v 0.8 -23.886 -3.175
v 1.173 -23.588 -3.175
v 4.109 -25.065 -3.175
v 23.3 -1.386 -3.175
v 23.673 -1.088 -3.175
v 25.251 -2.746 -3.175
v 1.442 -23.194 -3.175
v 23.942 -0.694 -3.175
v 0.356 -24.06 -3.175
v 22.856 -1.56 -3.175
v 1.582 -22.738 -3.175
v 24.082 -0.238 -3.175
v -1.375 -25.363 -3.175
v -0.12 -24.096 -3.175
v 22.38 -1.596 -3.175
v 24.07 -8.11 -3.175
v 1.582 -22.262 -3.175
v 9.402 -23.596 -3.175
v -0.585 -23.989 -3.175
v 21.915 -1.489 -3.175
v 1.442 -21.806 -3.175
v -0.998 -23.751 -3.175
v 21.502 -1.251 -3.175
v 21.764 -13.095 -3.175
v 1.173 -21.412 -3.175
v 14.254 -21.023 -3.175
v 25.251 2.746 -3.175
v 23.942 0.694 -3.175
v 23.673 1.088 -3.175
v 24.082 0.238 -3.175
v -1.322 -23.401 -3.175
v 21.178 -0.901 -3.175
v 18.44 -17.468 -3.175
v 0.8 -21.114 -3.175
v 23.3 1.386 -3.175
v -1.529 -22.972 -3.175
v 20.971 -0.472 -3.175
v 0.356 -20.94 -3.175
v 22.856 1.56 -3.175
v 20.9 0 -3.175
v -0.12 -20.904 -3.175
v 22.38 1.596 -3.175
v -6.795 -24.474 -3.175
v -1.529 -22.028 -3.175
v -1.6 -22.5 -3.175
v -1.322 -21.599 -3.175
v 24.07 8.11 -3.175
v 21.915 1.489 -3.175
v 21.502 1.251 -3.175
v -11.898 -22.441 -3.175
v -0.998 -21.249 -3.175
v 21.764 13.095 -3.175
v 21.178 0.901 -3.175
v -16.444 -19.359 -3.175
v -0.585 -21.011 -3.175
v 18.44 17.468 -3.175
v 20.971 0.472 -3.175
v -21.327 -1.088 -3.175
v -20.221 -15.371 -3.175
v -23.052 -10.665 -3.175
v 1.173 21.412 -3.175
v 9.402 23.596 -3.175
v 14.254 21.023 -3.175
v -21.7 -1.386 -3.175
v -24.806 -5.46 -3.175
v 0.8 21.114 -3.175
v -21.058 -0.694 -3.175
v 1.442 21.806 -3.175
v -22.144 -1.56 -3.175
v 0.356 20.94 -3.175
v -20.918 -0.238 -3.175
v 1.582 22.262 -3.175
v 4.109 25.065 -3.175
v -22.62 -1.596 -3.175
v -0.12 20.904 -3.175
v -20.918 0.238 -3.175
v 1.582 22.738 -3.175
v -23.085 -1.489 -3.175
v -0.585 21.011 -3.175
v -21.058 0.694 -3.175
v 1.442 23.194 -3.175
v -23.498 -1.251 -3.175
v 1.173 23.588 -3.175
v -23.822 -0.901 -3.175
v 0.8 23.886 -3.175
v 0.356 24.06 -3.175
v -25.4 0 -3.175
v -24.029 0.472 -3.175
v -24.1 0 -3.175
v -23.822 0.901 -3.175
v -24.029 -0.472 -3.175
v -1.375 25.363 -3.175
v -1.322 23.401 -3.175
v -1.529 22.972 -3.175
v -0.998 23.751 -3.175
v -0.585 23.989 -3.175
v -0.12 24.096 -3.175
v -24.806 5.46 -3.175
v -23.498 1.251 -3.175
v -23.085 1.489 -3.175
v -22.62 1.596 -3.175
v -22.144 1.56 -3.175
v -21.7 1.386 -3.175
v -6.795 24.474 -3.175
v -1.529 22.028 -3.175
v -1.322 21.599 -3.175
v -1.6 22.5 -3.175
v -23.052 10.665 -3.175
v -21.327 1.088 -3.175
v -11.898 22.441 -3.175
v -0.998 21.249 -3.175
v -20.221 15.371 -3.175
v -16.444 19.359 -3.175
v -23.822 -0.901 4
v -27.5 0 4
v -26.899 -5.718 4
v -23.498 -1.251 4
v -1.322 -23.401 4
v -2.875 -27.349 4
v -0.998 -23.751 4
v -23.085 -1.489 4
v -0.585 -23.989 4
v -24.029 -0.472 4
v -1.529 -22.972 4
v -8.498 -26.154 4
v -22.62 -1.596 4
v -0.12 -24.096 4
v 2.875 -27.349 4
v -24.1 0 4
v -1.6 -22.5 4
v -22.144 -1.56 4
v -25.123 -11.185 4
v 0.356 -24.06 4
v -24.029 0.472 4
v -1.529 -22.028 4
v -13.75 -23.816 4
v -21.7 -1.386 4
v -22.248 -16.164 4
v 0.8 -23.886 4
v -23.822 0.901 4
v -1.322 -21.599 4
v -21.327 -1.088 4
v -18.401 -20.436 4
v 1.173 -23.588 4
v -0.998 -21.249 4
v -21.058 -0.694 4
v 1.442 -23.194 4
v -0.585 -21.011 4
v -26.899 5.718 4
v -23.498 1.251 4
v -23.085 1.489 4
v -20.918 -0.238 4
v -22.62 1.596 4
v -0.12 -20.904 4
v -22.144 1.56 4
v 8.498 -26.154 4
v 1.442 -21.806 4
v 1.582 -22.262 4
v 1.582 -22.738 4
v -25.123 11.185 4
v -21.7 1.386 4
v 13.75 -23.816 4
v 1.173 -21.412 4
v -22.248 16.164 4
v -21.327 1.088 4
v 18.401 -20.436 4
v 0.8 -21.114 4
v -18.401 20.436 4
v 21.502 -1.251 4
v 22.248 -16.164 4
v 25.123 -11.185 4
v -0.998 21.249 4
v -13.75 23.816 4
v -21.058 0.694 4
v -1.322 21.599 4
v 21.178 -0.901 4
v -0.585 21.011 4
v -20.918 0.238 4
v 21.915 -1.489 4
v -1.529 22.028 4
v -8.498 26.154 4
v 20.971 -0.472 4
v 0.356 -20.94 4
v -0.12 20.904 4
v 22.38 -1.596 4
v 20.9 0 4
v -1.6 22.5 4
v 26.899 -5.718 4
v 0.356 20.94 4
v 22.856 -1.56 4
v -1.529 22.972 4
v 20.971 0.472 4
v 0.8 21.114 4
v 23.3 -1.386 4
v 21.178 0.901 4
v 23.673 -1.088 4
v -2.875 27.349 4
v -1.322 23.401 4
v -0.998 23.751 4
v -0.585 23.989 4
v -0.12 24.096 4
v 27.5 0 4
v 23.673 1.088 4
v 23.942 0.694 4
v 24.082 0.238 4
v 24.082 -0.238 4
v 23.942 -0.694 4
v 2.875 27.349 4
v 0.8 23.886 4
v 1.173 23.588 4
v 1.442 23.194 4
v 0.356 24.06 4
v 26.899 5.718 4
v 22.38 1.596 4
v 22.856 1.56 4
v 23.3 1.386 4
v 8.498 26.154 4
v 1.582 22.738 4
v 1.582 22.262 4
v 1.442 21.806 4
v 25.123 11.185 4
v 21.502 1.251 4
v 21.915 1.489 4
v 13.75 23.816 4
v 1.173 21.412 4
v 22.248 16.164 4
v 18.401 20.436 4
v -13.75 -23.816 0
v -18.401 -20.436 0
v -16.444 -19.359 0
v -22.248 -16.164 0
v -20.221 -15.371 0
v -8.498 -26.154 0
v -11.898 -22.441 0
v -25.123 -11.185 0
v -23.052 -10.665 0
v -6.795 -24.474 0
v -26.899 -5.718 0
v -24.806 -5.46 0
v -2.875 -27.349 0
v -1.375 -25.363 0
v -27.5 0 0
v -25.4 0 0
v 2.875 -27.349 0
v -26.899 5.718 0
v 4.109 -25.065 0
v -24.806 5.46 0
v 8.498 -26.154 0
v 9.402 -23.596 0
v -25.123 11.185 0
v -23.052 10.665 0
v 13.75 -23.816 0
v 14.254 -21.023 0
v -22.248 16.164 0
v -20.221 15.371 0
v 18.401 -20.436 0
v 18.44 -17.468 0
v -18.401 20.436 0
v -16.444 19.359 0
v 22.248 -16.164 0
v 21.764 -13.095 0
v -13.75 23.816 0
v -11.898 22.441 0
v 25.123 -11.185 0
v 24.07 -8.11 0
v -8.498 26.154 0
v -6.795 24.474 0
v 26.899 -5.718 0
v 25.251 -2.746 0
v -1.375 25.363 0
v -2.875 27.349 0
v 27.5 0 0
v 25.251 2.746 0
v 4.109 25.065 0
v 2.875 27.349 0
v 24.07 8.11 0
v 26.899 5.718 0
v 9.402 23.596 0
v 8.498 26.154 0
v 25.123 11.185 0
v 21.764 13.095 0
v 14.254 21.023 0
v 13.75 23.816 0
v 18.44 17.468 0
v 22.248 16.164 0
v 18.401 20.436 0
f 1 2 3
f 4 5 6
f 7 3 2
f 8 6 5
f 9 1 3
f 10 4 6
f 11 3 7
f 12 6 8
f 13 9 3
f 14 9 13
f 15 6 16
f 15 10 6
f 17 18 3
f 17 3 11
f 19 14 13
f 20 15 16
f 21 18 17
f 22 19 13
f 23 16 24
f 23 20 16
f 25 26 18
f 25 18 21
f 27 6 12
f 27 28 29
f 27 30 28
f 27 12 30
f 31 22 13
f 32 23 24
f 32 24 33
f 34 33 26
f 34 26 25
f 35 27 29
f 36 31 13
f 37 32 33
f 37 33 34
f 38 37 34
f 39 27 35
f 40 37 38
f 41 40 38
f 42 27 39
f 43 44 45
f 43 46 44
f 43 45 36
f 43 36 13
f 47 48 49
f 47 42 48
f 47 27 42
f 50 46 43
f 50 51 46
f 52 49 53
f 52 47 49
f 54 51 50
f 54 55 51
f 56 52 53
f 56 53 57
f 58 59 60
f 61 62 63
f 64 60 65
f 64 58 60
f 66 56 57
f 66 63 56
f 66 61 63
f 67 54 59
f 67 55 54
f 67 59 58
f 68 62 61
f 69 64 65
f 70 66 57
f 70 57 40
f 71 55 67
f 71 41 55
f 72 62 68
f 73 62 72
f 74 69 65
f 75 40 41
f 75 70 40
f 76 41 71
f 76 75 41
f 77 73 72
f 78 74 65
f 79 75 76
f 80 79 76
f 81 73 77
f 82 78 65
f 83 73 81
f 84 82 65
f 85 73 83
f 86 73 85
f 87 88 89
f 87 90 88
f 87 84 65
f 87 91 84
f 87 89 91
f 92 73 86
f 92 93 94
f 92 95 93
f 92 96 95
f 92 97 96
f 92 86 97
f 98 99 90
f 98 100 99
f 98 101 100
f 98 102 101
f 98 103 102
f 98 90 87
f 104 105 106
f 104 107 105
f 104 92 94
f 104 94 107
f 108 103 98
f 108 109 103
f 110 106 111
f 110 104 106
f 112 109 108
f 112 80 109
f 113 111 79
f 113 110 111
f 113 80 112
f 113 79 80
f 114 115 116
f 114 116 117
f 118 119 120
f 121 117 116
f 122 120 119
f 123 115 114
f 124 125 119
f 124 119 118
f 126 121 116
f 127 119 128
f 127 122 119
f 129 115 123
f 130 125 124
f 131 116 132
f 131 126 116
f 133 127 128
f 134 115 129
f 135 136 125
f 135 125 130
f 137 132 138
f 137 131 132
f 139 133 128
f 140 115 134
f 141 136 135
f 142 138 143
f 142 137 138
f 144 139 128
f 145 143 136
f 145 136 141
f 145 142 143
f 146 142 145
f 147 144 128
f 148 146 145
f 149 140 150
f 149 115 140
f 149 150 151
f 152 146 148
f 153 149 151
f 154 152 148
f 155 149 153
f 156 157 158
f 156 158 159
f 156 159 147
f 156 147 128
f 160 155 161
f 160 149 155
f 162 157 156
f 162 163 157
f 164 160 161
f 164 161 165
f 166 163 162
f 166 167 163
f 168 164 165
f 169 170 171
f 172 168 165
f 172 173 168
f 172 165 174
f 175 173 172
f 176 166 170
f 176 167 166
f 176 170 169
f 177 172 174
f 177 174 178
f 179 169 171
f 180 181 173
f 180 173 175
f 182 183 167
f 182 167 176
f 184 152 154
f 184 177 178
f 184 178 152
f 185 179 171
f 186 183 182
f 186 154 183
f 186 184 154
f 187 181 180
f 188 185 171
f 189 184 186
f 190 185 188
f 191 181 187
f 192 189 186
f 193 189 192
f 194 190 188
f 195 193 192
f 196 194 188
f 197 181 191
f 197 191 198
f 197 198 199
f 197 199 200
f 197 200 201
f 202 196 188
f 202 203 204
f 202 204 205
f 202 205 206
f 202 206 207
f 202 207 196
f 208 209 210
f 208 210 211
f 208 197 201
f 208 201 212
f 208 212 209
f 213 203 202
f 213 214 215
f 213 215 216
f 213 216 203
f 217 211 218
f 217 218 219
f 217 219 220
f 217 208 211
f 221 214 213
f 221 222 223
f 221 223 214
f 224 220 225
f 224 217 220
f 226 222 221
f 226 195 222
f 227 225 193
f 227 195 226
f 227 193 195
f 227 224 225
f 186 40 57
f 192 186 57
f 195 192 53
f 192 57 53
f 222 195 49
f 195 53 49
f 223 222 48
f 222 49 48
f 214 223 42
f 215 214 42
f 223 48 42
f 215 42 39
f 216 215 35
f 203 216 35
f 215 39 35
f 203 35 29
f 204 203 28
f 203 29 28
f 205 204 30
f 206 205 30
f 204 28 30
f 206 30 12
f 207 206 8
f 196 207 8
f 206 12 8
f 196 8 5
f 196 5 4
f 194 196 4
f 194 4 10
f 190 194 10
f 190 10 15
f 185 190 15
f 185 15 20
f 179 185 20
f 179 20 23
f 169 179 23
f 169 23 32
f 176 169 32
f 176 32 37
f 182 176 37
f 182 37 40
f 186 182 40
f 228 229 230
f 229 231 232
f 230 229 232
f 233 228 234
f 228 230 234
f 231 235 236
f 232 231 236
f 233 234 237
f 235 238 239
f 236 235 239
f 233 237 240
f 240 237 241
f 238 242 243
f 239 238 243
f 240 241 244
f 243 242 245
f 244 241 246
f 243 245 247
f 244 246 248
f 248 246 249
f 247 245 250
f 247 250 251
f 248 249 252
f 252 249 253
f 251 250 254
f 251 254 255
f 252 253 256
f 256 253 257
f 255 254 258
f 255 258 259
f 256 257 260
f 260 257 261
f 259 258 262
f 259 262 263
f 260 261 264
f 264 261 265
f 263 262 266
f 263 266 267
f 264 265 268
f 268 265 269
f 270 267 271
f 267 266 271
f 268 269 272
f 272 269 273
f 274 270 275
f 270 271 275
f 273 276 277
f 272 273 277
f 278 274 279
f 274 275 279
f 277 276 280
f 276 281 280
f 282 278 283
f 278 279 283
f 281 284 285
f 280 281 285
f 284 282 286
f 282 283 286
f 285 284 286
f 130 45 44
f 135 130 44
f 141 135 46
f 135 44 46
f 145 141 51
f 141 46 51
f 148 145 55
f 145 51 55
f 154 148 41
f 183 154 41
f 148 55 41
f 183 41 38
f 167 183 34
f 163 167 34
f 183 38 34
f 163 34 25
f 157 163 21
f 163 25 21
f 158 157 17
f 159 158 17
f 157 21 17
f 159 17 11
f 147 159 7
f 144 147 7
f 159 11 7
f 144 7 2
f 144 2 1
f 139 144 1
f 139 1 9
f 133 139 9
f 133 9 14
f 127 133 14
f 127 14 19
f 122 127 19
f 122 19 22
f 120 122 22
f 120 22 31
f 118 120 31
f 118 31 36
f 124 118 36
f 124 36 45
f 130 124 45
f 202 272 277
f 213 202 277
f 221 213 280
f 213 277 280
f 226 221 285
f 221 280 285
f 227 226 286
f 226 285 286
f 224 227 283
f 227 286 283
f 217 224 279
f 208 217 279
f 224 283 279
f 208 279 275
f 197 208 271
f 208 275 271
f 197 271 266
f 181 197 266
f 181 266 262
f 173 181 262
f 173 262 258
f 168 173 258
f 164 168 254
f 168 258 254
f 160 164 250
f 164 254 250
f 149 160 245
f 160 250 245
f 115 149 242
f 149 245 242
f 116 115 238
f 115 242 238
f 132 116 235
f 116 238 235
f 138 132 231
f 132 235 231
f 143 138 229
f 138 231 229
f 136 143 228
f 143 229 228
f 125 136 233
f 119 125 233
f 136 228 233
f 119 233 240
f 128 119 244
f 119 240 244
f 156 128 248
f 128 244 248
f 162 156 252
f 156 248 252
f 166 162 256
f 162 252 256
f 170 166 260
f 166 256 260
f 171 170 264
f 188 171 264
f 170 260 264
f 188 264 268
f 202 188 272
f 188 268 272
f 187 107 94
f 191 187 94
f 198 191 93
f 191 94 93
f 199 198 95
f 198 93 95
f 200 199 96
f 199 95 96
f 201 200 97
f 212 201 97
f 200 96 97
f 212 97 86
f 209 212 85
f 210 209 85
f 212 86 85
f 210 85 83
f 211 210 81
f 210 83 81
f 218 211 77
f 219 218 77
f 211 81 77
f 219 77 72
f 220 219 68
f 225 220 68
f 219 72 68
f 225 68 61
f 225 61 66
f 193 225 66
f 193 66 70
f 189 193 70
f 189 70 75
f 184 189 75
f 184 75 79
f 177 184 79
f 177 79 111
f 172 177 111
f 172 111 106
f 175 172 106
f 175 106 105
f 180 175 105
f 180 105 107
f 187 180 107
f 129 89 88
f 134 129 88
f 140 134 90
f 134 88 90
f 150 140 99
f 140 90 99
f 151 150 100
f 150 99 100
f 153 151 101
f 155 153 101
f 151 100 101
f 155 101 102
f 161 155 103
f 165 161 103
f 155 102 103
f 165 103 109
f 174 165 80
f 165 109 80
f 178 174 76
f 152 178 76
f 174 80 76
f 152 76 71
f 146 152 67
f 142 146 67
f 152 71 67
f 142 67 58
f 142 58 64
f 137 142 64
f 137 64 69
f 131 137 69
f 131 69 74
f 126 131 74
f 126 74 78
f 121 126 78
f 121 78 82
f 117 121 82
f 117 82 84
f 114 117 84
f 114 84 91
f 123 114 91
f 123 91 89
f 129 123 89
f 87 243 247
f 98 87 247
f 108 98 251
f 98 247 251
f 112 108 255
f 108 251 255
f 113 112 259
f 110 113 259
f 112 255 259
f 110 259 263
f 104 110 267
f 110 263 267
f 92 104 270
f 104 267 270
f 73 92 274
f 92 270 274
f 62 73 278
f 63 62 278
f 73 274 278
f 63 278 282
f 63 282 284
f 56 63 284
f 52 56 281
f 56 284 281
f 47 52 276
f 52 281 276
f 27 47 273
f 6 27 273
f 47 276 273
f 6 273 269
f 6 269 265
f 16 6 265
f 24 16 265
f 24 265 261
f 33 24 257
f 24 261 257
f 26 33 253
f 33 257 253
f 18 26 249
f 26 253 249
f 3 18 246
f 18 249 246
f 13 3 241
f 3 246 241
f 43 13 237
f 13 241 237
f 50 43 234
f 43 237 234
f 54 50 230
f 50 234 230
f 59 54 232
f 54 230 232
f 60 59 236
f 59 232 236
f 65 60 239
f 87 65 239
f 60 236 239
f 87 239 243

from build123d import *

# Parameters (mm, degrees)
SKETCH_1_R          = 27.5
EXTRUDE_1_DEPTH     = 4
SKETCH_2_R          = 25.4
EXTRUDE_2_DEPTH     = 3.175
SKETCH_3_R          = 1.6
CUT_EXTRUDE_1_DEPTH = 40.547194907


with BuildPart() as part:
    # ｽｹｯﾁ1 → ﾎﾞｽ - 押し出し1 (new body)
    with BuildSketch(Plane.XY):
        Circle(SKETCH_1_R)
    extrude(amount=EXTRUDE_1_DEPTH)

    # ｽｹｯﾁ2 → ﾎﾞｽ - 押し出し2 (add)
    with BuildSketch(Plane(origin=(0, 0, 0), x_dir=(-1, 0, 0), z_dir=(0, 0, -1))):
        Circle(SKETCH_2_R)
    extrude(amount=EXTRUDE_2_DEPTH)

    # ｽｹｯﾁ3 → ｶｯﾄ - 押し出し1 (cut, through all)
    with BuildSketch(Plane(origin=(0, 0, -3.175), x_dir=(-1, 0, 0), z_dir=(0, 0, -1))):
        with Locations((0, 22.5)):
            Circle(SKETCH_3_R)
        with Locations((22.5, 0)):
            Circle(SKETCH_3_R)
        with Locations((0, -22.5)):
            Circle(SKETCH_3_R)
        with Locations((-22.5, 0)):
            Circle(SKETCH_3_R)
    extrude(amount=-CUT_EXTRUDE_1_DEPTH, mode=Mode.SUBTRACT)


solid = part.part
